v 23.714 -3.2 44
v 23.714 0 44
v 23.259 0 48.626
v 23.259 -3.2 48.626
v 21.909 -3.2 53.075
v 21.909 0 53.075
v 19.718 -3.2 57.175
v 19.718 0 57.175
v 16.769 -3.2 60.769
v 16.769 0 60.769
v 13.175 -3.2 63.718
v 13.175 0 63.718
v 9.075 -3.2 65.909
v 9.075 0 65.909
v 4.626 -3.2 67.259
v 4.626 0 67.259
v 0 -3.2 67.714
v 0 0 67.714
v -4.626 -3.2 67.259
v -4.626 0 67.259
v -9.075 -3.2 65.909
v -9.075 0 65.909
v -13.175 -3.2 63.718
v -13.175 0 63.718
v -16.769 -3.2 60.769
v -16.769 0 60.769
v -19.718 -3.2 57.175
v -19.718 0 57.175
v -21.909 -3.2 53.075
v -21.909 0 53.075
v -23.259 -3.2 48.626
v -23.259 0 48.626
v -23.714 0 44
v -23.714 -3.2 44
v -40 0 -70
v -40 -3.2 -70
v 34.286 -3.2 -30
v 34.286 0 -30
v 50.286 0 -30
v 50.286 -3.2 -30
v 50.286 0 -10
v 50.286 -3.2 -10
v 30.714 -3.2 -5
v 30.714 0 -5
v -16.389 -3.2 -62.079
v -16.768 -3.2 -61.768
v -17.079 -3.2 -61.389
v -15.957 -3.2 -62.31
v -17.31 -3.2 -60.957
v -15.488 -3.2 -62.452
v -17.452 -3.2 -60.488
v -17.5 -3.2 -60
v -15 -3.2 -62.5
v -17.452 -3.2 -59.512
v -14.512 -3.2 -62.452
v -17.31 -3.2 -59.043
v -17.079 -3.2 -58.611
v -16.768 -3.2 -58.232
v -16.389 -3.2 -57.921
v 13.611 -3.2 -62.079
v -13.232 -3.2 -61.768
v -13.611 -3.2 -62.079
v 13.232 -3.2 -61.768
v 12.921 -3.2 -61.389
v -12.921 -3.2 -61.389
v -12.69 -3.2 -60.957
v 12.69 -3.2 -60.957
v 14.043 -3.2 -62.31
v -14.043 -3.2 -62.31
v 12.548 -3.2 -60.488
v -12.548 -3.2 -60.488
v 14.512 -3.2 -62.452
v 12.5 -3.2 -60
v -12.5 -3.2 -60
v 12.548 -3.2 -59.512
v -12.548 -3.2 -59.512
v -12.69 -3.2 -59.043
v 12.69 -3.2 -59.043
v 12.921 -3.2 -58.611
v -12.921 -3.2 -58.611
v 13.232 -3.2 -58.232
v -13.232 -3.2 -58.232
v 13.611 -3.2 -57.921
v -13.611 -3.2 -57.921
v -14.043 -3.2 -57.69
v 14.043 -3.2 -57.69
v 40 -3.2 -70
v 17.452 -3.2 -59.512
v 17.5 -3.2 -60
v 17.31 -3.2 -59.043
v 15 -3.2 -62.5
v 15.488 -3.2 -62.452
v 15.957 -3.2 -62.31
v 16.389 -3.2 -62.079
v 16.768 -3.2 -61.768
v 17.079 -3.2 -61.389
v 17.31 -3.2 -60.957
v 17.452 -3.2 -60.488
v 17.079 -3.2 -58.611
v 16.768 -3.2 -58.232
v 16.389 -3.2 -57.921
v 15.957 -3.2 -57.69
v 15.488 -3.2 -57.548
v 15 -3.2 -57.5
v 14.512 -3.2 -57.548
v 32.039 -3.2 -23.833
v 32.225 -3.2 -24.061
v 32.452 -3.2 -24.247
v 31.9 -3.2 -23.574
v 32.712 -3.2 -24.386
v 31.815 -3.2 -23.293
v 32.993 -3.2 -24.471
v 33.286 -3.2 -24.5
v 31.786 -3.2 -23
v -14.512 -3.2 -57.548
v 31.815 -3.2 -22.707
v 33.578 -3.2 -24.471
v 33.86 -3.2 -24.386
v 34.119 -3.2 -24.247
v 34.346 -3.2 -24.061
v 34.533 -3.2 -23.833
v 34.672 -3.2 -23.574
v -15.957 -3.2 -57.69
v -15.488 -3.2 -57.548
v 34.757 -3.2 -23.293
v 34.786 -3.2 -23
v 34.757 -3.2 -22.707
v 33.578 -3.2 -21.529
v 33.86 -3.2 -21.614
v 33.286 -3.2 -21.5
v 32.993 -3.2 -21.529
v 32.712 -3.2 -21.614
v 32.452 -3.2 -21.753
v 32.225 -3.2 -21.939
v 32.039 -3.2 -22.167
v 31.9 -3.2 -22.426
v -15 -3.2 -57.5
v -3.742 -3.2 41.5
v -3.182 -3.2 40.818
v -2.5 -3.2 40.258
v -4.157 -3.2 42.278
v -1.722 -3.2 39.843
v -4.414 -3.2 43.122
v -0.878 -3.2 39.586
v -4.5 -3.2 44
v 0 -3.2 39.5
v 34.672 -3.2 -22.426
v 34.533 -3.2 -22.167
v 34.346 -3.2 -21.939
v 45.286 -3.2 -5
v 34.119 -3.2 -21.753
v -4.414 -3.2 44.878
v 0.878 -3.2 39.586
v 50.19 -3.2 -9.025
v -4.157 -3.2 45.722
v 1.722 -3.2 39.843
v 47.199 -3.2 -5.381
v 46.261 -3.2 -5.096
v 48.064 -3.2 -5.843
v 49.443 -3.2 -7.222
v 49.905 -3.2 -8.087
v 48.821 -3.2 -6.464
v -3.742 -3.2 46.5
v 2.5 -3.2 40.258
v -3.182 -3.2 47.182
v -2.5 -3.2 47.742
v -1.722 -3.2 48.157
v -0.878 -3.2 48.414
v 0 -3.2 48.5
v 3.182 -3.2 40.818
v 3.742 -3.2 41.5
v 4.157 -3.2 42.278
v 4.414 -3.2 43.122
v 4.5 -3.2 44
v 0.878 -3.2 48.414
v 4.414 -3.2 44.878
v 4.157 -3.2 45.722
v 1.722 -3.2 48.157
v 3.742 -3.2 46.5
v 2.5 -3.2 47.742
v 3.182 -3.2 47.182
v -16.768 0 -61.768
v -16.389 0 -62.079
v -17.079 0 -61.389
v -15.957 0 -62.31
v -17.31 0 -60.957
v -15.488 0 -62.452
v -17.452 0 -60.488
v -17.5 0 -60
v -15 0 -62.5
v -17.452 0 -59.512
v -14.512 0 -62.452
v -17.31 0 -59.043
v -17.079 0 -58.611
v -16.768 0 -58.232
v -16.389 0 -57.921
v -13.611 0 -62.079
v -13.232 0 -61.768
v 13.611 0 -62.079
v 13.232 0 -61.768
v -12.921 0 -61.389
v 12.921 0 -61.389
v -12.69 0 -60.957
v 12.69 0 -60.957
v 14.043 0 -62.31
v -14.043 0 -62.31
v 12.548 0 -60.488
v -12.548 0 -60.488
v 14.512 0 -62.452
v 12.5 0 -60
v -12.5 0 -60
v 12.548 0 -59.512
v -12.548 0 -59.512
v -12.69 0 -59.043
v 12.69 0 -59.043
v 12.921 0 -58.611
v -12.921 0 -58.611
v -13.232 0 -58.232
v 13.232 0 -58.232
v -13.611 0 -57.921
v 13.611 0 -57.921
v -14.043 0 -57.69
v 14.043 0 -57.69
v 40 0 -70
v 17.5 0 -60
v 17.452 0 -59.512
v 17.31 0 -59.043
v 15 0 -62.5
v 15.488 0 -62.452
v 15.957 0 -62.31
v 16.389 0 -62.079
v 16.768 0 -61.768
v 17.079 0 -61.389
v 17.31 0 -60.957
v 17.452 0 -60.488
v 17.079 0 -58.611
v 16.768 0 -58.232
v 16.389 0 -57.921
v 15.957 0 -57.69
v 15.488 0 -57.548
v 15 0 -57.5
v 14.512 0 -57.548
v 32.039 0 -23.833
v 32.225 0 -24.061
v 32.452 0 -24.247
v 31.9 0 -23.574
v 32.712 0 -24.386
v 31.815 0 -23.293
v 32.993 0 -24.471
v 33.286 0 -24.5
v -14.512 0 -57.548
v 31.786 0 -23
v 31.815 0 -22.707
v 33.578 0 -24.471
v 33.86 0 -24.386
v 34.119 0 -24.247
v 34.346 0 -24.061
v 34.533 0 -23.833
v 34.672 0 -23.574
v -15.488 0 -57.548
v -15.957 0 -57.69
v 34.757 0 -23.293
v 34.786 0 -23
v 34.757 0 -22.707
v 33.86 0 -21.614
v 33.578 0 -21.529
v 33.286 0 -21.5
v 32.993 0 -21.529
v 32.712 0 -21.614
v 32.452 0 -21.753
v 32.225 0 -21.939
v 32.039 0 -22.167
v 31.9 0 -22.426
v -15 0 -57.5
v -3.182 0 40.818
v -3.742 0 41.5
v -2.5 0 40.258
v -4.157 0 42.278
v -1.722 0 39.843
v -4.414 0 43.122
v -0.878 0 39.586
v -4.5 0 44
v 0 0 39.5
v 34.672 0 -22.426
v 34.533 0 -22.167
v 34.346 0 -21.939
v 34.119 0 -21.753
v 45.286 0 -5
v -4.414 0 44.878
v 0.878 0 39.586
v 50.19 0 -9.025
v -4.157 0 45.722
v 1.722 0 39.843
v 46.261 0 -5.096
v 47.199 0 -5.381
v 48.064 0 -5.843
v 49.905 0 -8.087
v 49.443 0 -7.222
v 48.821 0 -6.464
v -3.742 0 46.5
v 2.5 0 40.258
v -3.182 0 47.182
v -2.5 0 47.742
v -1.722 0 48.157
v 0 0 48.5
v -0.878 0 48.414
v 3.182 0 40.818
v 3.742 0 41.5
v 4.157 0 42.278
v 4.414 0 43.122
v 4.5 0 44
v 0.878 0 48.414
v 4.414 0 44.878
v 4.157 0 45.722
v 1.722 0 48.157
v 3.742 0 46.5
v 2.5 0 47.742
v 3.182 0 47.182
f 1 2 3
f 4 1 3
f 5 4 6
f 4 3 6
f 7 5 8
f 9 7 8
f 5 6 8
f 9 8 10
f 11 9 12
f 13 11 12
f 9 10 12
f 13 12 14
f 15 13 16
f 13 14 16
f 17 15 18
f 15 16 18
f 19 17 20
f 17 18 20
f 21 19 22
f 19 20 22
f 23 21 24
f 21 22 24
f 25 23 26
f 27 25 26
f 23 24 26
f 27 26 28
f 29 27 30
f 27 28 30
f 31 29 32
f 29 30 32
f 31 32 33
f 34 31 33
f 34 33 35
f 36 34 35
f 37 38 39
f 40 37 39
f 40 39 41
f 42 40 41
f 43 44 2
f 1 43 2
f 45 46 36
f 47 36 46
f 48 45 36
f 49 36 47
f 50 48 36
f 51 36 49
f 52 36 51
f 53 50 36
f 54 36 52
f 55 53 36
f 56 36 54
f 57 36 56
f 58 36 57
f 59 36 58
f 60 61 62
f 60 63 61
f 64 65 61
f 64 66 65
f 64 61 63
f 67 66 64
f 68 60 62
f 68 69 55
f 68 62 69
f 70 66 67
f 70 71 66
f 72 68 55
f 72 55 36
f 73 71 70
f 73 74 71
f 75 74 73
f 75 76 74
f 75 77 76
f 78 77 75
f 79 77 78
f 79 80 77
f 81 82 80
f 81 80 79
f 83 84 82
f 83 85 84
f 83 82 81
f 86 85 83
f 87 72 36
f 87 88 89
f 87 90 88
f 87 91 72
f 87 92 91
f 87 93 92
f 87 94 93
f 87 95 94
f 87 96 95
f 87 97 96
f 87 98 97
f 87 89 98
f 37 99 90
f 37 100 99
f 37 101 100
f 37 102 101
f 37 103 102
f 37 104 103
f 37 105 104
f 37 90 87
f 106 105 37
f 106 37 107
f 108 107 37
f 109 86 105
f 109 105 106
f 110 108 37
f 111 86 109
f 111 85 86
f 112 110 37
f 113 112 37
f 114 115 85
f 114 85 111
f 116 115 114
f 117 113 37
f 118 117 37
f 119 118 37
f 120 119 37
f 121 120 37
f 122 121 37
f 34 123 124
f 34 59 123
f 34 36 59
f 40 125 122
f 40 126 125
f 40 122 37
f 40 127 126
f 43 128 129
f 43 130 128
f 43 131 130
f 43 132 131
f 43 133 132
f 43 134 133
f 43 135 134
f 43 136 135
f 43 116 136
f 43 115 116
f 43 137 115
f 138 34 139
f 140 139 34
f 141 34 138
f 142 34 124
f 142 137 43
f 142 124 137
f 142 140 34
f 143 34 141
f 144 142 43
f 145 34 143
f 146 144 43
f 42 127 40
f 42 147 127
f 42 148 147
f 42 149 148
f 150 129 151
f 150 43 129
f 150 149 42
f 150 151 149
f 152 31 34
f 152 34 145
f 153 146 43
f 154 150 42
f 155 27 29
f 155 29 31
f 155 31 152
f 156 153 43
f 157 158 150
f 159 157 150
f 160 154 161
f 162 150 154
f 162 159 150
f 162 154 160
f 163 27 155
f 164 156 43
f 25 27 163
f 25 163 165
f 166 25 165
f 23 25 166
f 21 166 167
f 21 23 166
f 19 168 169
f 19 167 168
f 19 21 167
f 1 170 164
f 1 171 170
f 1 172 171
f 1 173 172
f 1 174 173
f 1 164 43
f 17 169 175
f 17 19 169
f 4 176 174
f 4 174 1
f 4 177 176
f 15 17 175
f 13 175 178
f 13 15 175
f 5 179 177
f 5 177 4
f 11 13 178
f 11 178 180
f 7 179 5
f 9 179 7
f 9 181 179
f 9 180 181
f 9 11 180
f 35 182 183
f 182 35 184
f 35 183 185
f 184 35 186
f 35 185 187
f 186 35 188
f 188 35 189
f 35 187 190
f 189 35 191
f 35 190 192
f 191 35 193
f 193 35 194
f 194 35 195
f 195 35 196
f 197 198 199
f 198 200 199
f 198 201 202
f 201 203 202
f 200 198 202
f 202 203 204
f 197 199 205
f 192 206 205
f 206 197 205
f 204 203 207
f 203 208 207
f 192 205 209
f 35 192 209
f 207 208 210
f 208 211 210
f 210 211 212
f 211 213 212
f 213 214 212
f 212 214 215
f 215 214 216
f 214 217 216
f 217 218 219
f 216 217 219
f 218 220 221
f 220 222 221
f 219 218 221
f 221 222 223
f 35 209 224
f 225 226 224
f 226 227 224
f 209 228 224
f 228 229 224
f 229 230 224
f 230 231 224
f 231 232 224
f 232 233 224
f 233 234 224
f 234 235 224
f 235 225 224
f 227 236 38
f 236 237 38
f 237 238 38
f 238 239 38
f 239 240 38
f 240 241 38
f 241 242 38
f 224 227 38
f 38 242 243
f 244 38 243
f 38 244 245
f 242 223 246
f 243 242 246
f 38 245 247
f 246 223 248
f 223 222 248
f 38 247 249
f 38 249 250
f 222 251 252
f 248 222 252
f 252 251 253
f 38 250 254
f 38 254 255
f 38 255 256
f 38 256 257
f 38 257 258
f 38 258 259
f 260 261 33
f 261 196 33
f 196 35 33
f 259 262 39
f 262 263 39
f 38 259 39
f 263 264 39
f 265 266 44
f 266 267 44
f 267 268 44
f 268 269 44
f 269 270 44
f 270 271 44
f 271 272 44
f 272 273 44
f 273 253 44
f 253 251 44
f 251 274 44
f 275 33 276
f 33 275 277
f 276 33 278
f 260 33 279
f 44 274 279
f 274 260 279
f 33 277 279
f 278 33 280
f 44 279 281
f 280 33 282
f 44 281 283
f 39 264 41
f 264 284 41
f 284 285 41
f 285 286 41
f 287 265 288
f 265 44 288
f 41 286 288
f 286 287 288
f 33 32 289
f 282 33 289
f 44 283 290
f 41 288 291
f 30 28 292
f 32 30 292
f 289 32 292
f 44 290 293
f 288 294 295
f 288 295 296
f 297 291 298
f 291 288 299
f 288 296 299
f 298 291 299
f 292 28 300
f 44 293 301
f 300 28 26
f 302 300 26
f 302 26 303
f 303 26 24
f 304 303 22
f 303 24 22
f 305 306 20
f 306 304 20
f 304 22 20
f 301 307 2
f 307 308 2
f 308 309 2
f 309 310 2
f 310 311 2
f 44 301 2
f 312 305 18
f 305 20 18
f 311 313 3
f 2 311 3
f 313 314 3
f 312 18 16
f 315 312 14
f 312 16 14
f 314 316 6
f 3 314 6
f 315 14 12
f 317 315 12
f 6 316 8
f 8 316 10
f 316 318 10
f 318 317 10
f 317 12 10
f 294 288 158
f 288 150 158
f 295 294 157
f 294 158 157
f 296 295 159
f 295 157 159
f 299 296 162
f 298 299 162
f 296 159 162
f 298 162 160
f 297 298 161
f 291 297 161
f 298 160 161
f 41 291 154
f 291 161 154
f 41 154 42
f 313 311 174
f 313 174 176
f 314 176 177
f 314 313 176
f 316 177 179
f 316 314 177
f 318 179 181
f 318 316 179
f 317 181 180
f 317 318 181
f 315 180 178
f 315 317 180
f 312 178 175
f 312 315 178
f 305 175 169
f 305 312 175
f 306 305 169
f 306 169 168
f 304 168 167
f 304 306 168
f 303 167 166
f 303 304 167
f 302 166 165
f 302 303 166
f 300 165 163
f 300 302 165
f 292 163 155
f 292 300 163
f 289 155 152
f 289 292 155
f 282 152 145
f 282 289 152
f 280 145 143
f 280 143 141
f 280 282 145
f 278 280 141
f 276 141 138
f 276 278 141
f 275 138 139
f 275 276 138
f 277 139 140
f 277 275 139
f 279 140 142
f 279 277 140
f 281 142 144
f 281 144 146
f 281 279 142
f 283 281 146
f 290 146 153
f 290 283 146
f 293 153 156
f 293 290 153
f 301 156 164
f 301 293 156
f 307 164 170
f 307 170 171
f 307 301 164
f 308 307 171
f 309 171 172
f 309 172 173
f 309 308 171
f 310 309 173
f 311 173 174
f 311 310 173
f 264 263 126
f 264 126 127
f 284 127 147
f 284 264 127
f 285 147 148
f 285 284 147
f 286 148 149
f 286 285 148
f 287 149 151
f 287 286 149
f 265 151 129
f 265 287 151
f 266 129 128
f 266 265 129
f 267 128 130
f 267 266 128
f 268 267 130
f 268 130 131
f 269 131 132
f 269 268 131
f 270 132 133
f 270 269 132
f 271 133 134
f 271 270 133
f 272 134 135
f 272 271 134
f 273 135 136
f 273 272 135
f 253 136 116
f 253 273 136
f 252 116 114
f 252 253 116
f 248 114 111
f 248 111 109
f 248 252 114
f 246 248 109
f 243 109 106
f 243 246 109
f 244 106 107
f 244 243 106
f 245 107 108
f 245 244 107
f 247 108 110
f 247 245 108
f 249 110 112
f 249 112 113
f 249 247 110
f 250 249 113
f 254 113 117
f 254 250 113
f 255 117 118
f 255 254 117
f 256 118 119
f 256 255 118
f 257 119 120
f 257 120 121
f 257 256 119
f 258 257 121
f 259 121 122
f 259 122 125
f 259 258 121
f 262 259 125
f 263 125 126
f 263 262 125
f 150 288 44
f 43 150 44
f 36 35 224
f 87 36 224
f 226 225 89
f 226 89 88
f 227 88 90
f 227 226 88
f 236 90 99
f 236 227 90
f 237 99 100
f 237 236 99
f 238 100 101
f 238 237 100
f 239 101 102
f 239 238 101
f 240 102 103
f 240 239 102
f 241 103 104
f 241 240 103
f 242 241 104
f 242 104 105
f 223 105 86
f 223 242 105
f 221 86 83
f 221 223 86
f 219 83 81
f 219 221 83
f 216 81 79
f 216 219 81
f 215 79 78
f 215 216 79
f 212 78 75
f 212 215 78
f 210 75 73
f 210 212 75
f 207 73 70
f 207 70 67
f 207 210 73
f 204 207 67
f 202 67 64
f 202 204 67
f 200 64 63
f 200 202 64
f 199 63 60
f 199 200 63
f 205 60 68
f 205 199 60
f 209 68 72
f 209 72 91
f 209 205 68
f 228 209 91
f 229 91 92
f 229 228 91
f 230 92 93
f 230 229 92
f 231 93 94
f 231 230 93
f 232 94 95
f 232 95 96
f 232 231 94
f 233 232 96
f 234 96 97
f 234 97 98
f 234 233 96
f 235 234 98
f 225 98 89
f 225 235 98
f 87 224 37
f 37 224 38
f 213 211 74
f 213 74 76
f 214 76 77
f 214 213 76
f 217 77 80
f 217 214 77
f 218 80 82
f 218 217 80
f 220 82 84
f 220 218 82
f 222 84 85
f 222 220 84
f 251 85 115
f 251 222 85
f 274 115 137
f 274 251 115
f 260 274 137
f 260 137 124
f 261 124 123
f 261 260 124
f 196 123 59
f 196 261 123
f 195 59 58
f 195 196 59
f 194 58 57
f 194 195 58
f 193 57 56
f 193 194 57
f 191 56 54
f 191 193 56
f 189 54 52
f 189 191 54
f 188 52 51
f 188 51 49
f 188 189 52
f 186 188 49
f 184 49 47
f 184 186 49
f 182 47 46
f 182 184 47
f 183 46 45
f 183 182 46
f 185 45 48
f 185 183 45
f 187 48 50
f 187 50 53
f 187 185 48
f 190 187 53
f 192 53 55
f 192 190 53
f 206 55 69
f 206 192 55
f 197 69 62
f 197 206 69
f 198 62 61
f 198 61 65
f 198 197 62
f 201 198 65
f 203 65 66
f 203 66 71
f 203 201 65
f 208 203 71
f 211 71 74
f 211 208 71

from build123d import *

# Parameters (mm, degrees)
F0_R     = 2.5
F0_R_2   = 1.5
F0_R_3   = 4.5
F1_DEPTH = 3.2
F2_R     = 5


with BuildPart() as f1:
    # F0 (on Front) → F1 (new body)
    with BuildSketch(Plane.XZ):
        with BuildLine():
            Line((-23.714286, 44), (-40, -70))
            Line((-40, -70), (40, -70))
            Line((40, -70), (34.285714, -30))
            Line((34.285714, -30), (50.285714, -30))
            Line((50.285714, -30), (50.285714, -5))
            Line((50.285714, -5), (30.714286, -5))
            Line((30.714286, -5), (23.714286, 44))
            ThreePointArc((23.714286, 44), (0, 67.714286), (-23.714286, 44))
        make_face()
        with Locations((-15, -60)):
            Circle(F0_R, mode=Mode.SUBTRACT)
        with Locations((15, -60)):
            Circle(F0_R, mode=Mode.SUBTRACT)
        with Locations((33.285714, -23)):
            Circle(F0_R_2, mode=Mode.SUBTRACT)
        with Locations((0, 44)):
            Circle(F0_R_3, mode=Mode.SUBTRACT)
    extrude(amount=F1_DEPTH)

    # F2
    f2_edges = [f1.edges().sort_by_distance(p)[0] for p in [
        (50.285714, -1.6, -5),
    ]]
    fillet(f2_edges, radius=F2_R)


solid = f1.part
